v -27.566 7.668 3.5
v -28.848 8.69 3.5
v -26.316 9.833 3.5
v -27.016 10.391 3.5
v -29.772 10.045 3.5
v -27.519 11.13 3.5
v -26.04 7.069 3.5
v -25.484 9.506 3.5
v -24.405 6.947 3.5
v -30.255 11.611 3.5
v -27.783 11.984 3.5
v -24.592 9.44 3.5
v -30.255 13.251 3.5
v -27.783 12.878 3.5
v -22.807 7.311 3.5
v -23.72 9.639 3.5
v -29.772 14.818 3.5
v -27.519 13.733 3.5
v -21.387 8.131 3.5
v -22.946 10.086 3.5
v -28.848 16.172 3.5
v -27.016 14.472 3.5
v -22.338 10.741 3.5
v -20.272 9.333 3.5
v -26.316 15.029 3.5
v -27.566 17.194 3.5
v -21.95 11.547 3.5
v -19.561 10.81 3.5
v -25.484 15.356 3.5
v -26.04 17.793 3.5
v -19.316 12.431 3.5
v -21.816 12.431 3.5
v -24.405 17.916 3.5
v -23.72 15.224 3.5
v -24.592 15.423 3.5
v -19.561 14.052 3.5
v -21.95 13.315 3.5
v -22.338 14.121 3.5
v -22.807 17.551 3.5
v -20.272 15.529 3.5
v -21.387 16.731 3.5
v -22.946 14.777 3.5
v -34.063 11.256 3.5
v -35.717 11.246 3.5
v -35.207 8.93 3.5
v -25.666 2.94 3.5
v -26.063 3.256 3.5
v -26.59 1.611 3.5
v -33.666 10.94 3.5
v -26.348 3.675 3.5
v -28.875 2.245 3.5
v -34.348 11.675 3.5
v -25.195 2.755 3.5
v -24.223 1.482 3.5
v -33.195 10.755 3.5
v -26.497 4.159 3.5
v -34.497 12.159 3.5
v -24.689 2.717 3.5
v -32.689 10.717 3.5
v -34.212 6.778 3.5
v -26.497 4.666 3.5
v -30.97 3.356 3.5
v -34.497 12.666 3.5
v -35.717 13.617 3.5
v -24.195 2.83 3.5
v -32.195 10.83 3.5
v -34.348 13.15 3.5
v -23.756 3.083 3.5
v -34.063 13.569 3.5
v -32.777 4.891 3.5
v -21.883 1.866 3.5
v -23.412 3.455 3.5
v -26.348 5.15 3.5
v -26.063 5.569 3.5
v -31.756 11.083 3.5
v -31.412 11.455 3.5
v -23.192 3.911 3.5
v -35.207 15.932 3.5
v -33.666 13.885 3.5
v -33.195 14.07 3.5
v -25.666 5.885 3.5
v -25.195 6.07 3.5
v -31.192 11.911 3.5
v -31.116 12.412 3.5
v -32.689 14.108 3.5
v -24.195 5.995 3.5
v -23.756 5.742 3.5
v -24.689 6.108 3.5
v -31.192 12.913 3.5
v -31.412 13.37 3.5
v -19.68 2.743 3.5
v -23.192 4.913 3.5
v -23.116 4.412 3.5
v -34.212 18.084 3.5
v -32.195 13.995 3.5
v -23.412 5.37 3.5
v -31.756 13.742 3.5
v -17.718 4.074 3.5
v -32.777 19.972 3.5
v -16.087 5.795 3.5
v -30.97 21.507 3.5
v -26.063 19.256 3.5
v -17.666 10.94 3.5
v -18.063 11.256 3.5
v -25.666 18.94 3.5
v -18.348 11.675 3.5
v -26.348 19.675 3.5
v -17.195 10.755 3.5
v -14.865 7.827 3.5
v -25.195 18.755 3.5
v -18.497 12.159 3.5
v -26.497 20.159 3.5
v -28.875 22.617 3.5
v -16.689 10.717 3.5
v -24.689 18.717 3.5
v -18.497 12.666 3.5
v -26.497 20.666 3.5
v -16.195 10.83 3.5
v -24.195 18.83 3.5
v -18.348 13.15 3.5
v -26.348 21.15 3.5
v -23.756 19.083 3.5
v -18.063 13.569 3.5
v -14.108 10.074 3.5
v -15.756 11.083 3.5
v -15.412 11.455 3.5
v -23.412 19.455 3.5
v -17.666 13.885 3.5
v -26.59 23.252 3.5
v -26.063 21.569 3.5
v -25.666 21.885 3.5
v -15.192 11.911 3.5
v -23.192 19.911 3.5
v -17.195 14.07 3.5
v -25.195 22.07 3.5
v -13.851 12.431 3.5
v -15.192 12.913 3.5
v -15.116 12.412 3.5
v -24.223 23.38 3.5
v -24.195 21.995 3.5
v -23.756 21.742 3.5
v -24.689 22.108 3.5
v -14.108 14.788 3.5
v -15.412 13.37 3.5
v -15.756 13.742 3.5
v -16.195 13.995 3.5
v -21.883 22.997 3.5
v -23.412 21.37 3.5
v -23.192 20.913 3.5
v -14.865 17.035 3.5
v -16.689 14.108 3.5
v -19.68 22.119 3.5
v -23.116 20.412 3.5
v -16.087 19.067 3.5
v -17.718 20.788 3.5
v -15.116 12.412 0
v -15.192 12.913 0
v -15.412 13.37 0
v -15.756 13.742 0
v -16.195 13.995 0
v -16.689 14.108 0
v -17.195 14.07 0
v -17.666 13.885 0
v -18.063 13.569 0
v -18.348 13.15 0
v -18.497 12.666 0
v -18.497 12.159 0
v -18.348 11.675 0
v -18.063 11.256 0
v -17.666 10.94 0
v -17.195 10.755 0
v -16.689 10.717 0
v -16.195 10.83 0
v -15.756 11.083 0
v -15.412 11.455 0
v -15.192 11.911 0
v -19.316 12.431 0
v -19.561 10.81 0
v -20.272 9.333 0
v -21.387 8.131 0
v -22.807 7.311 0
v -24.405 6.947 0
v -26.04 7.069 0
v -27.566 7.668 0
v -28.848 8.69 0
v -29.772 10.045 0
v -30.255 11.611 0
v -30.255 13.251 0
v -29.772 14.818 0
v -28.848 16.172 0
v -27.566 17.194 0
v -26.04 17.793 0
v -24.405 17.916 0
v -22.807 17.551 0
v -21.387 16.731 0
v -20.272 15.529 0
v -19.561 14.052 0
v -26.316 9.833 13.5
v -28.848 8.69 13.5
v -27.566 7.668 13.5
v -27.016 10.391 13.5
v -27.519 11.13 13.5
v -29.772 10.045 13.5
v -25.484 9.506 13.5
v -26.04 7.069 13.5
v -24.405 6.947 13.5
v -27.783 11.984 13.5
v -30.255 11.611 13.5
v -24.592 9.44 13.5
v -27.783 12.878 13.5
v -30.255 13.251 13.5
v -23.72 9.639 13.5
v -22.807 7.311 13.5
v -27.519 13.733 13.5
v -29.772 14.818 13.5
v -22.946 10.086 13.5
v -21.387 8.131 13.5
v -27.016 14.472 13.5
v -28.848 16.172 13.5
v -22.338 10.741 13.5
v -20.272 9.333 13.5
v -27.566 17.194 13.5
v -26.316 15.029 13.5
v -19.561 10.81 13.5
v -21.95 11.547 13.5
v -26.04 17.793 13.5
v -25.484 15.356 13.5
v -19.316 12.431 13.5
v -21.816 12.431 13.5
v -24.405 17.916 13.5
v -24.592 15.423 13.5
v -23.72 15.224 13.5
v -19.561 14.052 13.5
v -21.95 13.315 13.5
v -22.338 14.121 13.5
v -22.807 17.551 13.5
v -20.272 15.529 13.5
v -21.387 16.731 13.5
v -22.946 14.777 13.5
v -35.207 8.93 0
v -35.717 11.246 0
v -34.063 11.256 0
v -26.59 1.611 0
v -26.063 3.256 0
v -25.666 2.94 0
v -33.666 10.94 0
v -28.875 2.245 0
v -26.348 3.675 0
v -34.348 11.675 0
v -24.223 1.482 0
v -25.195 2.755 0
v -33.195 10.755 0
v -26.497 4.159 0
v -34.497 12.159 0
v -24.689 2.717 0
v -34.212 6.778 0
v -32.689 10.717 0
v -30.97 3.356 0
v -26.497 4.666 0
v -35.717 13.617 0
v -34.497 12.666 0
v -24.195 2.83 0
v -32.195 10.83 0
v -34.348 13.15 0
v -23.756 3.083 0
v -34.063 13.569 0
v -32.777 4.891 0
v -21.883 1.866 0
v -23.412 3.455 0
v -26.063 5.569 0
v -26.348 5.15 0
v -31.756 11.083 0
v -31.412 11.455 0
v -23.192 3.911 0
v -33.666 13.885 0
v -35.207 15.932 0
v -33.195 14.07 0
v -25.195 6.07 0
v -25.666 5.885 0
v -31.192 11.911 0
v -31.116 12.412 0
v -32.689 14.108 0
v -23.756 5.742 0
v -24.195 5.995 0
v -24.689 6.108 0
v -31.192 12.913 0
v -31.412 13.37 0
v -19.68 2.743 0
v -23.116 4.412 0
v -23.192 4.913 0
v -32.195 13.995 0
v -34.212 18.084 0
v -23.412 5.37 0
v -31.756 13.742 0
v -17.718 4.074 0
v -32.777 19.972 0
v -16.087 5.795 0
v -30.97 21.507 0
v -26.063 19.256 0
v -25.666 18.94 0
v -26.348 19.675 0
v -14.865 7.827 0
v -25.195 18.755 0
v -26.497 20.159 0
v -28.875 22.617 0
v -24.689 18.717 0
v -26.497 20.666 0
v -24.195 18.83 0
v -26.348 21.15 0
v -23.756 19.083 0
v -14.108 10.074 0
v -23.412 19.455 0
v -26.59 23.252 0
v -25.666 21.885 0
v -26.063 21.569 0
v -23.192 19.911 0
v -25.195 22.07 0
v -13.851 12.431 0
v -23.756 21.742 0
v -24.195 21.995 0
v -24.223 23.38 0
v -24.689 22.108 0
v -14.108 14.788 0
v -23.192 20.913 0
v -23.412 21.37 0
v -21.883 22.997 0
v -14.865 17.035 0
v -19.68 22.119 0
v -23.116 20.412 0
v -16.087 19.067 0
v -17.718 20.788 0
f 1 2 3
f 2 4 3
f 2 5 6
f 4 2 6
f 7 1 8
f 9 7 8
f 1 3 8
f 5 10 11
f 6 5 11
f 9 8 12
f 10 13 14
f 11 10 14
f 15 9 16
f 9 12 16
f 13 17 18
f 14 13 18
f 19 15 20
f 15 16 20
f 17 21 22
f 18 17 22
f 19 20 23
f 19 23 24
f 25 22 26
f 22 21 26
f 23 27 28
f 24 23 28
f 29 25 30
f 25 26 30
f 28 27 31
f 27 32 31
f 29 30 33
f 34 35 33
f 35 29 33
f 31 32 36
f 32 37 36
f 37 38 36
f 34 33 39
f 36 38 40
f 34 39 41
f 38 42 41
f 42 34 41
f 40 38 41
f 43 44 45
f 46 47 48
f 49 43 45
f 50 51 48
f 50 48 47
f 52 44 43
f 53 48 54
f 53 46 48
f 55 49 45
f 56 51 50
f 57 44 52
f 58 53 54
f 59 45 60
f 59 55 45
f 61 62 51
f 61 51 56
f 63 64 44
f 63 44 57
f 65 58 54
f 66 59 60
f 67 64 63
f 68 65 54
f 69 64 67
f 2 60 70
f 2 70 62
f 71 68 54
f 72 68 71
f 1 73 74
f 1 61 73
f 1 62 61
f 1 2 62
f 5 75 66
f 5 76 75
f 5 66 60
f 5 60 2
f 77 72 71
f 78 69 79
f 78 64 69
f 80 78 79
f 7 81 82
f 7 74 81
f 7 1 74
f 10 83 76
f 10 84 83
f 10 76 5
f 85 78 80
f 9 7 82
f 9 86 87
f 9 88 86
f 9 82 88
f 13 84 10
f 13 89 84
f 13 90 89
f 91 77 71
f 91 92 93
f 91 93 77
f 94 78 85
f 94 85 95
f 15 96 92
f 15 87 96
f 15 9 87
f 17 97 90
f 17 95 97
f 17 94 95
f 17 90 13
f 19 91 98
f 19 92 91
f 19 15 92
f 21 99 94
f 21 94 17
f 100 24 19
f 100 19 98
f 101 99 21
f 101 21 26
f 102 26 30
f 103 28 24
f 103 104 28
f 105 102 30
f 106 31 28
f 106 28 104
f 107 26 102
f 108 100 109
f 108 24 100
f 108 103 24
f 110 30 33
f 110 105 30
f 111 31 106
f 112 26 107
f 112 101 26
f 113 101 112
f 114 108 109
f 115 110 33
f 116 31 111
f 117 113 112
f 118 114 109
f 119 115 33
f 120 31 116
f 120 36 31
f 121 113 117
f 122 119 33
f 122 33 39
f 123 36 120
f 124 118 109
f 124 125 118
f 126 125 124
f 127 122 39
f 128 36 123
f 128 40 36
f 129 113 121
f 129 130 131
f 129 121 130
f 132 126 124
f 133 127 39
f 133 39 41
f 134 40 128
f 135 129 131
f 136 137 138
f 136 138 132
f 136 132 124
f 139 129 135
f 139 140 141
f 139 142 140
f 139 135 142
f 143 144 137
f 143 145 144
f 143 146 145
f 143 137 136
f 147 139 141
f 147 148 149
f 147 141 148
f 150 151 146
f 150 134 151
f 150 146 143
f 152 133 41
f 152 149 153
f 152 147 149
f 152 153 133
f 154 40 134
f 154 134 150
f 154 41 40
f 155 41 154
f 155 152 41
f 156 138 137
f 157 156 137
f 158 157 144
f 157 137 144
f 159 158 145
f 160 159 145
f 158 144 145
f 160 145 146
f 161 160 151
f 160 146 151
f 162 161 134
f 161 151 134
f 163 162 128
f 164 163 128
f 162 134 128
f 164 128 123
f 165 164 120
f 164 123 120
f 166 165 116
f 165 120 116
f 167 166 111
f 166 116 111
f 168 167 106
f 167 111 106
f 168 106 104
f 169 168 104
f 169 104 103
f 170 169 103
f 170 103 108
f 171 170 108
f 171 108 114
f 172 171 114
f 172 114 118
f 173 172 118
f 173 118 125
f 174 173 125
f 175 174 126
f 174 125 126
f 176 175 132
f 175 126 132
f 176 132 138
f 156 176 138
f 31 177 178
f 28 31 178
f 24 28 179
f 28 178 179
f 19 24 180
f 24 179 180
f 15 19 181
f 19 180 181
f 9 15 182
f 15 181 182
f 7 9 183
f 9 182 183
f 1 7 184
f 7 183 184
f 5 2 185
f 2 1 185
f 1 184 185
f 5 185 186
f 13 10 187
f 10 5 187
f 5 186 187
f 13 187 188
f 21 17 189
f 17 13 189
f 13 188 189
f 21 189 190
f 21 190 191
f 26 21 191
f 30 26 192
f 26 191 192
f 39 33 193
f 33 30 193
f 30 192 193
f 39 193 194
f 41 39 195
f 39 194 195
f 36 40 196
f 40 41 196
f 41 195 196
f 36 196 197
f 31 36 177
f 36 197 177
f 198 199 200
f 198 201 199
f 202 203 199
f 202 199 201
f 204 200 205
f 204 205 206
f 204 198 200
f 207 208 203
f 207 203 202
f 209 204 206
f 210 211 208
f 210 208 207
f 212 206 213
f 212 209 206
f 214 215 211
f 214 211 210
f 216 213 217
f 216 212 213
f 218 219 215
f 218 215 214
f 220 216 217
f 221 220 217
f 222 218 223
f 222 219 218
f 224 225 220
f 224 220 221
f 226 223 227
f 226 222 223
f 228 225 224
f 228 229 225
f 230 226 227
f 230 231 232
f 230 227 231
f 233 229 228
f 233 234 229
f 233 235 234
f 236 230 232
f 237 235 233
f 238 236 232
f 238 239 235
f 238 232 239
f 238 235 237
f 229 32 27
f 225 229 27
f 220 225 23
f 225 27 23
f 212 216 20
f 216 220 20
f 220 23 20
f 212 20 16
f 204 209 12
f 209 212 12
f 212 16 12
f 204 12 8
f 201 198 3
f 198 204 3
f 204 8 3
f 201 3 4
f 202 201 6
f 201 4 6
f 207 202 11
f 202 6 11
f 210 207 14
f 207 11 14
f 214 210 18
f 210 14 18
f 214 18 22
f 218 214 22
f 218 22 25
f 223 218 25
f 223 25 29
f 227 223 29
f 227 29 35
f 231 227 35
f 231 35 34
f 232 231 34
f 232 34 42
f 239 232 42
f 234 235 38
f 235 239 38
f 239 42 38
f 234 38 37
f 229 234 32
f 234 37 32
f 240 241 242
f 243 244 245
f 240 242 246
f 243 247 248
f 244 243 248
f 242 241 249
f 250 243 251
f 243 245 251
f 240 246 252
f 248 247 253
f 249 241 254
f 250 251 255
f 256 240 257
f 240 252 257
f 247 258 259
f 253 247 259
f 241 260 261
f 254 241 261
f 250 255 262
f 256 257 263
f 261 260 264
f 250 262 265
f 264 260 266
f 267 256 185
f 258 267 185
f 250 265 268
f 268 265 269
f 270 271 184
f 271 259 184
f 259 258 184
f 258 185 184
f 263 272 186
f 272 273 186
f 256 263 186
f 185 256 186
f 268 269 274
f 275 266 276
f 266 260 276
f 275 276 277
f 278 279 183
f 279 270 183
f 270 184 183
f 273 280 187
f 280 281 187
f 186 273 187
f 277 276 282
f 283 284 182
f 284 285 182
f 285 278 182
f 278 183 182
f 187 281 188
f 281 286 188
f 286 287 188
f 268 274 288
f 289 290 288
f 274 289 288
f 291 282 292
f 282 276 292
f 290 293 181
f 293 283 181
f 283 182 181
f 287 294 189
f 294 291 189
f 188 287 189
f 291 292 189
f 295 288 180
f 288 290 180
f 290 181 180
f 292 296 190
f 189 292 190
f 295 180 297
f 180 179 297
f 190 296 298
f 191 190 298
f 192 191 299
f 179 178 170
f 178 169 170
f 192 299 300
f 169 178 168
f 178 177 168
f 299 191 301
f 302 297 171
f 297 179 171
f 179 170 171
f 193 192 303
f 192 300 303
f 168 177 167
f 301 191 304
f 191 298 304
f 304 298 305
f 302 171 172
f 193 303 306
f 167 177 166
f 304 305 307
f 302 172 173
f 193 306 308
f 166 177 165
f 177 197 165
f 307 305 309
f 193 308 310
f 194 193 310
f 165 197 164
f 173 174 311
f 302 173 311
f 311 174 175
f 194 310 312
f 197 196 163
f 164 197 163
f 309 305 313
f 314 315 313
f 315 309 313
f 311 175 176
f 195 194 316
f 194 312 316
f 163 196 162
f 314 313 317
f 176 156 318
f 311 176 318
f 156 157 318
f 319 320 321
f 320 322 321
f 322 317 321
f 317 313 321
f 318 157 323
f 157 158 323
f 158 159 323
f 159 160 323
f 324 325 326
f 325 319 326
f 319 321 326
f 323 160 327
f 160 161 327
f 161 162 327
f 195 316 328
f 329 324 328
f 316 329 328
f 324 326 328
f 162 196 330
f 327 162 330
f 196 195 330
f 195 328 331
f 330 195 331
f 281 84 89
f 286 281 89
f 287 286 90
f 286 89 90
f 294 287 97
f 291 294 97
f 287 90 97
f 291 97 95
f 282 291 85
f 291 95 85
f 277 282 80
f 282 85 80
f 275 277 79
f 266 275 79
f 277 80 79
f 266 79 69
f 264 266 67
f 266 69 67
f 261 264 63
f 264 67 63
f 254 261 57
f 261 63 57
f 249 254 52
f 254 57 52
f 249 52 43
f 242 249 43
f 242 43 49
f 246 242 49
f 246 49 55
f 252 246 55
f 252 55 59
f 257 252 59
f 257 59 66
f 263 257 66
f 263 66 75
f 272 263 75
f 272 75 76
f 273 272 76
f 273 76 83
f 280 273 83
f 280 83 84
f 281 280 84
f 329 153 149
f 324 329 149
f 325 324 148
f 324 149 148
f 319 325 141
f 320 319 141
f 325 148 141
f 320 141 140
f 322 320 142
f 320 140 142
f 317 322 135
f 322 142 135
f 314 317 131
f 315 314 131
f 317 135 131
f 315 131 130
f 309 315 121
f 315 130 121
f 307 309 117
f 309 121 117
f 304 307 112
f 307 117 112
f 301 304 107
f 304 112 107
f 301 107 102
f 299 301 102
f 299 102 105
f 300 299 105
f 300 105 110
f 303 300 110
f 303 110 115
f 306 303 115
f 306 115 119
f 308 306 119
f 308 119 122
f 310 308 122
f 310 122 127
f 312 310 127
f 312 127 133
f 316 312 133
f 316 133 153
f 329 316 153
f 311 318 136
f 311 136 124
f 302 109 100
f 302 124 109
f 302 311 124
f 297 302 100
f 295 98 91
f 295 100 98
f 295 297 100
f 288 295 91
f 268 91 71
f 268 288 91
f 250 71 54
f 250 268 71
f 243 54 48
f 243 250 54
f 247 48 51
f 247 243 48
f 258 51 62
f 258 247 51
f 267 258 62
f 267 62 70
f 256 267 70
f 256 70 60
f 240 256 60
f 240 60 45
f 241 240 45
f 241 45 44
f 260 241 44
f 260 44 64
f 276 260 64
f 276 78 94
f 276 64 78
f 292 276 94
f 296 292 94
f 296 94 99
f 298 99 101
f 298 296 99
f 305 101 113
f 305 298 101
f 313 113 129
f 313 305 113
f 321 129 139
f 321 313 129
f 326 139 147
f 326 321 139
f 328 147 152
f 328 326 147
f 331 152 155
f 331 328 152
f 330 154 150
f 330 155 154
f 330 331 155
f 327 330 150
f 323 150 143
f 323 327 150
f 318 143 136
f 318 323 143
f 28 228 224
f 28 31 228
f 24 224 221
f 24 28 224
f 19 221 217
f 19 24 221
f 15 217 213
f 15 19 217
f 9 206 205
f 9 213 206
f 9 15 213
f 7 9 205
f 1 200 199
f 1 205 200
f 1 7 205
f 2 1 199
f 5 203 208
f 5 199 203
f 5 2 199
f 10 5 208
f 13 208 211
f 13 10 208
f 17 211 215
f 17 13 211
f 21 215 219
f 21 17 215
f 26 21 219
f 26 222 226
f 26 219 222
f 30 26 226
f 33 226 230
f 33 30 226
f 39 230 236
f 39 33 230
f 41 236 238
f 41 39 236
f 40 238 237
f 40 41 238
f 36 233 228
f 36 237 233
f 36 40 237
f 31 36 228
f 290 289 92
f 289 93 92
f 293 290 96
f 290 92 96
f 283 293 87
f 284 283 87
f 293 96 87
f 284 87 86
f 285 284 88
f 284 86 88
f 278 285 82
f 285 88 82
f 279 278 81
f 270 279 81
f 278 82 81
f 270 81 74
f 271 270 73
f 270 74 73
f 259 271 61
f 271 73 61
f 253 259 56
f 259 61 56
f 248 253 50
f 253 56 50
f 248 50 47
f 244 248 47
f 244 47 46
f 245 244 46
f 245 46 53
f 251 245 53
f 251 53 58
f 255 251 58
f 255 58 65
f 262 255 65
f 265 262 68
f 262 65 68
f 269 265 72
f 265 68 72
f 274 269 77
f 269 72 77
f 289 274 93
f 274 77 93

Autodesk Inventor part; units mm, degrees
ref_plane "YZ Plane" through (0, 0, 0) normal (1, 0, 0) x (0, 1, 0)
ref_plane "XZ Plane" through (0, 0, 0) normal (0, 1, 0) x (-1, 0, 0)
ref_plane "XY Plane" through (0, 0, 0) normal (0, 0, 1) x (1, 0, 0)
sketch "Sketch1" plane through (0, 0, 0) normal (0, 0, 1) x (1, 0, 0)
  circle A0 centre (-24.8164, 12.4312) radius 5.5 projected
  circle A1 centre (-24.8164, 12.4312) radius 10.965
  circle A2 centre (-24.8164, 12.4312) radius 5.08
  point P0 (0, 0)
  dimension "d0" = 21.93
  dimension "d1" = 10.16
extrude "Extrusion1" add sketch "Sketch1" along normal blind 3.5 contours A1
sketch "Sketch2" plane through (-24.8164, 12.4312, 3.5) normal (0, 0, 1) x (1, 0, 0)
  circle A0 centre (0, 0) radius 3
  circle A1 centre (0, 0) radius 5.5
  point P0 (24.8164, -12.4312)
  dimension "d4" = 6
extrude "Extrusion2" add sketch "Sketch2" along normal blind 10
sketch "Sketch3" plane through (-24.8164, 12.4312, 3.5) normal (0, 0, 1) x (1, 0, 0)
  circle A0 centre (-8, -0.0188) radius 1.7 projected
  circle A1 centre (0, -8.0188) radius 1.7 projected
  circle A2 centre (8, -0.0188) radius 1.7 projected
  circle A3 centre (0, 7.9812) radius 1.7 projected
  point P0 (24.8164, -12.4312)
extrude "Extrusion3" cut sketch "Sketch3" against normal blind 10
thread "Thread1" size "M10x1.5" class "6H" standard "ANSI Metric M Profile" full length
properties part number "Brass-Nut"
